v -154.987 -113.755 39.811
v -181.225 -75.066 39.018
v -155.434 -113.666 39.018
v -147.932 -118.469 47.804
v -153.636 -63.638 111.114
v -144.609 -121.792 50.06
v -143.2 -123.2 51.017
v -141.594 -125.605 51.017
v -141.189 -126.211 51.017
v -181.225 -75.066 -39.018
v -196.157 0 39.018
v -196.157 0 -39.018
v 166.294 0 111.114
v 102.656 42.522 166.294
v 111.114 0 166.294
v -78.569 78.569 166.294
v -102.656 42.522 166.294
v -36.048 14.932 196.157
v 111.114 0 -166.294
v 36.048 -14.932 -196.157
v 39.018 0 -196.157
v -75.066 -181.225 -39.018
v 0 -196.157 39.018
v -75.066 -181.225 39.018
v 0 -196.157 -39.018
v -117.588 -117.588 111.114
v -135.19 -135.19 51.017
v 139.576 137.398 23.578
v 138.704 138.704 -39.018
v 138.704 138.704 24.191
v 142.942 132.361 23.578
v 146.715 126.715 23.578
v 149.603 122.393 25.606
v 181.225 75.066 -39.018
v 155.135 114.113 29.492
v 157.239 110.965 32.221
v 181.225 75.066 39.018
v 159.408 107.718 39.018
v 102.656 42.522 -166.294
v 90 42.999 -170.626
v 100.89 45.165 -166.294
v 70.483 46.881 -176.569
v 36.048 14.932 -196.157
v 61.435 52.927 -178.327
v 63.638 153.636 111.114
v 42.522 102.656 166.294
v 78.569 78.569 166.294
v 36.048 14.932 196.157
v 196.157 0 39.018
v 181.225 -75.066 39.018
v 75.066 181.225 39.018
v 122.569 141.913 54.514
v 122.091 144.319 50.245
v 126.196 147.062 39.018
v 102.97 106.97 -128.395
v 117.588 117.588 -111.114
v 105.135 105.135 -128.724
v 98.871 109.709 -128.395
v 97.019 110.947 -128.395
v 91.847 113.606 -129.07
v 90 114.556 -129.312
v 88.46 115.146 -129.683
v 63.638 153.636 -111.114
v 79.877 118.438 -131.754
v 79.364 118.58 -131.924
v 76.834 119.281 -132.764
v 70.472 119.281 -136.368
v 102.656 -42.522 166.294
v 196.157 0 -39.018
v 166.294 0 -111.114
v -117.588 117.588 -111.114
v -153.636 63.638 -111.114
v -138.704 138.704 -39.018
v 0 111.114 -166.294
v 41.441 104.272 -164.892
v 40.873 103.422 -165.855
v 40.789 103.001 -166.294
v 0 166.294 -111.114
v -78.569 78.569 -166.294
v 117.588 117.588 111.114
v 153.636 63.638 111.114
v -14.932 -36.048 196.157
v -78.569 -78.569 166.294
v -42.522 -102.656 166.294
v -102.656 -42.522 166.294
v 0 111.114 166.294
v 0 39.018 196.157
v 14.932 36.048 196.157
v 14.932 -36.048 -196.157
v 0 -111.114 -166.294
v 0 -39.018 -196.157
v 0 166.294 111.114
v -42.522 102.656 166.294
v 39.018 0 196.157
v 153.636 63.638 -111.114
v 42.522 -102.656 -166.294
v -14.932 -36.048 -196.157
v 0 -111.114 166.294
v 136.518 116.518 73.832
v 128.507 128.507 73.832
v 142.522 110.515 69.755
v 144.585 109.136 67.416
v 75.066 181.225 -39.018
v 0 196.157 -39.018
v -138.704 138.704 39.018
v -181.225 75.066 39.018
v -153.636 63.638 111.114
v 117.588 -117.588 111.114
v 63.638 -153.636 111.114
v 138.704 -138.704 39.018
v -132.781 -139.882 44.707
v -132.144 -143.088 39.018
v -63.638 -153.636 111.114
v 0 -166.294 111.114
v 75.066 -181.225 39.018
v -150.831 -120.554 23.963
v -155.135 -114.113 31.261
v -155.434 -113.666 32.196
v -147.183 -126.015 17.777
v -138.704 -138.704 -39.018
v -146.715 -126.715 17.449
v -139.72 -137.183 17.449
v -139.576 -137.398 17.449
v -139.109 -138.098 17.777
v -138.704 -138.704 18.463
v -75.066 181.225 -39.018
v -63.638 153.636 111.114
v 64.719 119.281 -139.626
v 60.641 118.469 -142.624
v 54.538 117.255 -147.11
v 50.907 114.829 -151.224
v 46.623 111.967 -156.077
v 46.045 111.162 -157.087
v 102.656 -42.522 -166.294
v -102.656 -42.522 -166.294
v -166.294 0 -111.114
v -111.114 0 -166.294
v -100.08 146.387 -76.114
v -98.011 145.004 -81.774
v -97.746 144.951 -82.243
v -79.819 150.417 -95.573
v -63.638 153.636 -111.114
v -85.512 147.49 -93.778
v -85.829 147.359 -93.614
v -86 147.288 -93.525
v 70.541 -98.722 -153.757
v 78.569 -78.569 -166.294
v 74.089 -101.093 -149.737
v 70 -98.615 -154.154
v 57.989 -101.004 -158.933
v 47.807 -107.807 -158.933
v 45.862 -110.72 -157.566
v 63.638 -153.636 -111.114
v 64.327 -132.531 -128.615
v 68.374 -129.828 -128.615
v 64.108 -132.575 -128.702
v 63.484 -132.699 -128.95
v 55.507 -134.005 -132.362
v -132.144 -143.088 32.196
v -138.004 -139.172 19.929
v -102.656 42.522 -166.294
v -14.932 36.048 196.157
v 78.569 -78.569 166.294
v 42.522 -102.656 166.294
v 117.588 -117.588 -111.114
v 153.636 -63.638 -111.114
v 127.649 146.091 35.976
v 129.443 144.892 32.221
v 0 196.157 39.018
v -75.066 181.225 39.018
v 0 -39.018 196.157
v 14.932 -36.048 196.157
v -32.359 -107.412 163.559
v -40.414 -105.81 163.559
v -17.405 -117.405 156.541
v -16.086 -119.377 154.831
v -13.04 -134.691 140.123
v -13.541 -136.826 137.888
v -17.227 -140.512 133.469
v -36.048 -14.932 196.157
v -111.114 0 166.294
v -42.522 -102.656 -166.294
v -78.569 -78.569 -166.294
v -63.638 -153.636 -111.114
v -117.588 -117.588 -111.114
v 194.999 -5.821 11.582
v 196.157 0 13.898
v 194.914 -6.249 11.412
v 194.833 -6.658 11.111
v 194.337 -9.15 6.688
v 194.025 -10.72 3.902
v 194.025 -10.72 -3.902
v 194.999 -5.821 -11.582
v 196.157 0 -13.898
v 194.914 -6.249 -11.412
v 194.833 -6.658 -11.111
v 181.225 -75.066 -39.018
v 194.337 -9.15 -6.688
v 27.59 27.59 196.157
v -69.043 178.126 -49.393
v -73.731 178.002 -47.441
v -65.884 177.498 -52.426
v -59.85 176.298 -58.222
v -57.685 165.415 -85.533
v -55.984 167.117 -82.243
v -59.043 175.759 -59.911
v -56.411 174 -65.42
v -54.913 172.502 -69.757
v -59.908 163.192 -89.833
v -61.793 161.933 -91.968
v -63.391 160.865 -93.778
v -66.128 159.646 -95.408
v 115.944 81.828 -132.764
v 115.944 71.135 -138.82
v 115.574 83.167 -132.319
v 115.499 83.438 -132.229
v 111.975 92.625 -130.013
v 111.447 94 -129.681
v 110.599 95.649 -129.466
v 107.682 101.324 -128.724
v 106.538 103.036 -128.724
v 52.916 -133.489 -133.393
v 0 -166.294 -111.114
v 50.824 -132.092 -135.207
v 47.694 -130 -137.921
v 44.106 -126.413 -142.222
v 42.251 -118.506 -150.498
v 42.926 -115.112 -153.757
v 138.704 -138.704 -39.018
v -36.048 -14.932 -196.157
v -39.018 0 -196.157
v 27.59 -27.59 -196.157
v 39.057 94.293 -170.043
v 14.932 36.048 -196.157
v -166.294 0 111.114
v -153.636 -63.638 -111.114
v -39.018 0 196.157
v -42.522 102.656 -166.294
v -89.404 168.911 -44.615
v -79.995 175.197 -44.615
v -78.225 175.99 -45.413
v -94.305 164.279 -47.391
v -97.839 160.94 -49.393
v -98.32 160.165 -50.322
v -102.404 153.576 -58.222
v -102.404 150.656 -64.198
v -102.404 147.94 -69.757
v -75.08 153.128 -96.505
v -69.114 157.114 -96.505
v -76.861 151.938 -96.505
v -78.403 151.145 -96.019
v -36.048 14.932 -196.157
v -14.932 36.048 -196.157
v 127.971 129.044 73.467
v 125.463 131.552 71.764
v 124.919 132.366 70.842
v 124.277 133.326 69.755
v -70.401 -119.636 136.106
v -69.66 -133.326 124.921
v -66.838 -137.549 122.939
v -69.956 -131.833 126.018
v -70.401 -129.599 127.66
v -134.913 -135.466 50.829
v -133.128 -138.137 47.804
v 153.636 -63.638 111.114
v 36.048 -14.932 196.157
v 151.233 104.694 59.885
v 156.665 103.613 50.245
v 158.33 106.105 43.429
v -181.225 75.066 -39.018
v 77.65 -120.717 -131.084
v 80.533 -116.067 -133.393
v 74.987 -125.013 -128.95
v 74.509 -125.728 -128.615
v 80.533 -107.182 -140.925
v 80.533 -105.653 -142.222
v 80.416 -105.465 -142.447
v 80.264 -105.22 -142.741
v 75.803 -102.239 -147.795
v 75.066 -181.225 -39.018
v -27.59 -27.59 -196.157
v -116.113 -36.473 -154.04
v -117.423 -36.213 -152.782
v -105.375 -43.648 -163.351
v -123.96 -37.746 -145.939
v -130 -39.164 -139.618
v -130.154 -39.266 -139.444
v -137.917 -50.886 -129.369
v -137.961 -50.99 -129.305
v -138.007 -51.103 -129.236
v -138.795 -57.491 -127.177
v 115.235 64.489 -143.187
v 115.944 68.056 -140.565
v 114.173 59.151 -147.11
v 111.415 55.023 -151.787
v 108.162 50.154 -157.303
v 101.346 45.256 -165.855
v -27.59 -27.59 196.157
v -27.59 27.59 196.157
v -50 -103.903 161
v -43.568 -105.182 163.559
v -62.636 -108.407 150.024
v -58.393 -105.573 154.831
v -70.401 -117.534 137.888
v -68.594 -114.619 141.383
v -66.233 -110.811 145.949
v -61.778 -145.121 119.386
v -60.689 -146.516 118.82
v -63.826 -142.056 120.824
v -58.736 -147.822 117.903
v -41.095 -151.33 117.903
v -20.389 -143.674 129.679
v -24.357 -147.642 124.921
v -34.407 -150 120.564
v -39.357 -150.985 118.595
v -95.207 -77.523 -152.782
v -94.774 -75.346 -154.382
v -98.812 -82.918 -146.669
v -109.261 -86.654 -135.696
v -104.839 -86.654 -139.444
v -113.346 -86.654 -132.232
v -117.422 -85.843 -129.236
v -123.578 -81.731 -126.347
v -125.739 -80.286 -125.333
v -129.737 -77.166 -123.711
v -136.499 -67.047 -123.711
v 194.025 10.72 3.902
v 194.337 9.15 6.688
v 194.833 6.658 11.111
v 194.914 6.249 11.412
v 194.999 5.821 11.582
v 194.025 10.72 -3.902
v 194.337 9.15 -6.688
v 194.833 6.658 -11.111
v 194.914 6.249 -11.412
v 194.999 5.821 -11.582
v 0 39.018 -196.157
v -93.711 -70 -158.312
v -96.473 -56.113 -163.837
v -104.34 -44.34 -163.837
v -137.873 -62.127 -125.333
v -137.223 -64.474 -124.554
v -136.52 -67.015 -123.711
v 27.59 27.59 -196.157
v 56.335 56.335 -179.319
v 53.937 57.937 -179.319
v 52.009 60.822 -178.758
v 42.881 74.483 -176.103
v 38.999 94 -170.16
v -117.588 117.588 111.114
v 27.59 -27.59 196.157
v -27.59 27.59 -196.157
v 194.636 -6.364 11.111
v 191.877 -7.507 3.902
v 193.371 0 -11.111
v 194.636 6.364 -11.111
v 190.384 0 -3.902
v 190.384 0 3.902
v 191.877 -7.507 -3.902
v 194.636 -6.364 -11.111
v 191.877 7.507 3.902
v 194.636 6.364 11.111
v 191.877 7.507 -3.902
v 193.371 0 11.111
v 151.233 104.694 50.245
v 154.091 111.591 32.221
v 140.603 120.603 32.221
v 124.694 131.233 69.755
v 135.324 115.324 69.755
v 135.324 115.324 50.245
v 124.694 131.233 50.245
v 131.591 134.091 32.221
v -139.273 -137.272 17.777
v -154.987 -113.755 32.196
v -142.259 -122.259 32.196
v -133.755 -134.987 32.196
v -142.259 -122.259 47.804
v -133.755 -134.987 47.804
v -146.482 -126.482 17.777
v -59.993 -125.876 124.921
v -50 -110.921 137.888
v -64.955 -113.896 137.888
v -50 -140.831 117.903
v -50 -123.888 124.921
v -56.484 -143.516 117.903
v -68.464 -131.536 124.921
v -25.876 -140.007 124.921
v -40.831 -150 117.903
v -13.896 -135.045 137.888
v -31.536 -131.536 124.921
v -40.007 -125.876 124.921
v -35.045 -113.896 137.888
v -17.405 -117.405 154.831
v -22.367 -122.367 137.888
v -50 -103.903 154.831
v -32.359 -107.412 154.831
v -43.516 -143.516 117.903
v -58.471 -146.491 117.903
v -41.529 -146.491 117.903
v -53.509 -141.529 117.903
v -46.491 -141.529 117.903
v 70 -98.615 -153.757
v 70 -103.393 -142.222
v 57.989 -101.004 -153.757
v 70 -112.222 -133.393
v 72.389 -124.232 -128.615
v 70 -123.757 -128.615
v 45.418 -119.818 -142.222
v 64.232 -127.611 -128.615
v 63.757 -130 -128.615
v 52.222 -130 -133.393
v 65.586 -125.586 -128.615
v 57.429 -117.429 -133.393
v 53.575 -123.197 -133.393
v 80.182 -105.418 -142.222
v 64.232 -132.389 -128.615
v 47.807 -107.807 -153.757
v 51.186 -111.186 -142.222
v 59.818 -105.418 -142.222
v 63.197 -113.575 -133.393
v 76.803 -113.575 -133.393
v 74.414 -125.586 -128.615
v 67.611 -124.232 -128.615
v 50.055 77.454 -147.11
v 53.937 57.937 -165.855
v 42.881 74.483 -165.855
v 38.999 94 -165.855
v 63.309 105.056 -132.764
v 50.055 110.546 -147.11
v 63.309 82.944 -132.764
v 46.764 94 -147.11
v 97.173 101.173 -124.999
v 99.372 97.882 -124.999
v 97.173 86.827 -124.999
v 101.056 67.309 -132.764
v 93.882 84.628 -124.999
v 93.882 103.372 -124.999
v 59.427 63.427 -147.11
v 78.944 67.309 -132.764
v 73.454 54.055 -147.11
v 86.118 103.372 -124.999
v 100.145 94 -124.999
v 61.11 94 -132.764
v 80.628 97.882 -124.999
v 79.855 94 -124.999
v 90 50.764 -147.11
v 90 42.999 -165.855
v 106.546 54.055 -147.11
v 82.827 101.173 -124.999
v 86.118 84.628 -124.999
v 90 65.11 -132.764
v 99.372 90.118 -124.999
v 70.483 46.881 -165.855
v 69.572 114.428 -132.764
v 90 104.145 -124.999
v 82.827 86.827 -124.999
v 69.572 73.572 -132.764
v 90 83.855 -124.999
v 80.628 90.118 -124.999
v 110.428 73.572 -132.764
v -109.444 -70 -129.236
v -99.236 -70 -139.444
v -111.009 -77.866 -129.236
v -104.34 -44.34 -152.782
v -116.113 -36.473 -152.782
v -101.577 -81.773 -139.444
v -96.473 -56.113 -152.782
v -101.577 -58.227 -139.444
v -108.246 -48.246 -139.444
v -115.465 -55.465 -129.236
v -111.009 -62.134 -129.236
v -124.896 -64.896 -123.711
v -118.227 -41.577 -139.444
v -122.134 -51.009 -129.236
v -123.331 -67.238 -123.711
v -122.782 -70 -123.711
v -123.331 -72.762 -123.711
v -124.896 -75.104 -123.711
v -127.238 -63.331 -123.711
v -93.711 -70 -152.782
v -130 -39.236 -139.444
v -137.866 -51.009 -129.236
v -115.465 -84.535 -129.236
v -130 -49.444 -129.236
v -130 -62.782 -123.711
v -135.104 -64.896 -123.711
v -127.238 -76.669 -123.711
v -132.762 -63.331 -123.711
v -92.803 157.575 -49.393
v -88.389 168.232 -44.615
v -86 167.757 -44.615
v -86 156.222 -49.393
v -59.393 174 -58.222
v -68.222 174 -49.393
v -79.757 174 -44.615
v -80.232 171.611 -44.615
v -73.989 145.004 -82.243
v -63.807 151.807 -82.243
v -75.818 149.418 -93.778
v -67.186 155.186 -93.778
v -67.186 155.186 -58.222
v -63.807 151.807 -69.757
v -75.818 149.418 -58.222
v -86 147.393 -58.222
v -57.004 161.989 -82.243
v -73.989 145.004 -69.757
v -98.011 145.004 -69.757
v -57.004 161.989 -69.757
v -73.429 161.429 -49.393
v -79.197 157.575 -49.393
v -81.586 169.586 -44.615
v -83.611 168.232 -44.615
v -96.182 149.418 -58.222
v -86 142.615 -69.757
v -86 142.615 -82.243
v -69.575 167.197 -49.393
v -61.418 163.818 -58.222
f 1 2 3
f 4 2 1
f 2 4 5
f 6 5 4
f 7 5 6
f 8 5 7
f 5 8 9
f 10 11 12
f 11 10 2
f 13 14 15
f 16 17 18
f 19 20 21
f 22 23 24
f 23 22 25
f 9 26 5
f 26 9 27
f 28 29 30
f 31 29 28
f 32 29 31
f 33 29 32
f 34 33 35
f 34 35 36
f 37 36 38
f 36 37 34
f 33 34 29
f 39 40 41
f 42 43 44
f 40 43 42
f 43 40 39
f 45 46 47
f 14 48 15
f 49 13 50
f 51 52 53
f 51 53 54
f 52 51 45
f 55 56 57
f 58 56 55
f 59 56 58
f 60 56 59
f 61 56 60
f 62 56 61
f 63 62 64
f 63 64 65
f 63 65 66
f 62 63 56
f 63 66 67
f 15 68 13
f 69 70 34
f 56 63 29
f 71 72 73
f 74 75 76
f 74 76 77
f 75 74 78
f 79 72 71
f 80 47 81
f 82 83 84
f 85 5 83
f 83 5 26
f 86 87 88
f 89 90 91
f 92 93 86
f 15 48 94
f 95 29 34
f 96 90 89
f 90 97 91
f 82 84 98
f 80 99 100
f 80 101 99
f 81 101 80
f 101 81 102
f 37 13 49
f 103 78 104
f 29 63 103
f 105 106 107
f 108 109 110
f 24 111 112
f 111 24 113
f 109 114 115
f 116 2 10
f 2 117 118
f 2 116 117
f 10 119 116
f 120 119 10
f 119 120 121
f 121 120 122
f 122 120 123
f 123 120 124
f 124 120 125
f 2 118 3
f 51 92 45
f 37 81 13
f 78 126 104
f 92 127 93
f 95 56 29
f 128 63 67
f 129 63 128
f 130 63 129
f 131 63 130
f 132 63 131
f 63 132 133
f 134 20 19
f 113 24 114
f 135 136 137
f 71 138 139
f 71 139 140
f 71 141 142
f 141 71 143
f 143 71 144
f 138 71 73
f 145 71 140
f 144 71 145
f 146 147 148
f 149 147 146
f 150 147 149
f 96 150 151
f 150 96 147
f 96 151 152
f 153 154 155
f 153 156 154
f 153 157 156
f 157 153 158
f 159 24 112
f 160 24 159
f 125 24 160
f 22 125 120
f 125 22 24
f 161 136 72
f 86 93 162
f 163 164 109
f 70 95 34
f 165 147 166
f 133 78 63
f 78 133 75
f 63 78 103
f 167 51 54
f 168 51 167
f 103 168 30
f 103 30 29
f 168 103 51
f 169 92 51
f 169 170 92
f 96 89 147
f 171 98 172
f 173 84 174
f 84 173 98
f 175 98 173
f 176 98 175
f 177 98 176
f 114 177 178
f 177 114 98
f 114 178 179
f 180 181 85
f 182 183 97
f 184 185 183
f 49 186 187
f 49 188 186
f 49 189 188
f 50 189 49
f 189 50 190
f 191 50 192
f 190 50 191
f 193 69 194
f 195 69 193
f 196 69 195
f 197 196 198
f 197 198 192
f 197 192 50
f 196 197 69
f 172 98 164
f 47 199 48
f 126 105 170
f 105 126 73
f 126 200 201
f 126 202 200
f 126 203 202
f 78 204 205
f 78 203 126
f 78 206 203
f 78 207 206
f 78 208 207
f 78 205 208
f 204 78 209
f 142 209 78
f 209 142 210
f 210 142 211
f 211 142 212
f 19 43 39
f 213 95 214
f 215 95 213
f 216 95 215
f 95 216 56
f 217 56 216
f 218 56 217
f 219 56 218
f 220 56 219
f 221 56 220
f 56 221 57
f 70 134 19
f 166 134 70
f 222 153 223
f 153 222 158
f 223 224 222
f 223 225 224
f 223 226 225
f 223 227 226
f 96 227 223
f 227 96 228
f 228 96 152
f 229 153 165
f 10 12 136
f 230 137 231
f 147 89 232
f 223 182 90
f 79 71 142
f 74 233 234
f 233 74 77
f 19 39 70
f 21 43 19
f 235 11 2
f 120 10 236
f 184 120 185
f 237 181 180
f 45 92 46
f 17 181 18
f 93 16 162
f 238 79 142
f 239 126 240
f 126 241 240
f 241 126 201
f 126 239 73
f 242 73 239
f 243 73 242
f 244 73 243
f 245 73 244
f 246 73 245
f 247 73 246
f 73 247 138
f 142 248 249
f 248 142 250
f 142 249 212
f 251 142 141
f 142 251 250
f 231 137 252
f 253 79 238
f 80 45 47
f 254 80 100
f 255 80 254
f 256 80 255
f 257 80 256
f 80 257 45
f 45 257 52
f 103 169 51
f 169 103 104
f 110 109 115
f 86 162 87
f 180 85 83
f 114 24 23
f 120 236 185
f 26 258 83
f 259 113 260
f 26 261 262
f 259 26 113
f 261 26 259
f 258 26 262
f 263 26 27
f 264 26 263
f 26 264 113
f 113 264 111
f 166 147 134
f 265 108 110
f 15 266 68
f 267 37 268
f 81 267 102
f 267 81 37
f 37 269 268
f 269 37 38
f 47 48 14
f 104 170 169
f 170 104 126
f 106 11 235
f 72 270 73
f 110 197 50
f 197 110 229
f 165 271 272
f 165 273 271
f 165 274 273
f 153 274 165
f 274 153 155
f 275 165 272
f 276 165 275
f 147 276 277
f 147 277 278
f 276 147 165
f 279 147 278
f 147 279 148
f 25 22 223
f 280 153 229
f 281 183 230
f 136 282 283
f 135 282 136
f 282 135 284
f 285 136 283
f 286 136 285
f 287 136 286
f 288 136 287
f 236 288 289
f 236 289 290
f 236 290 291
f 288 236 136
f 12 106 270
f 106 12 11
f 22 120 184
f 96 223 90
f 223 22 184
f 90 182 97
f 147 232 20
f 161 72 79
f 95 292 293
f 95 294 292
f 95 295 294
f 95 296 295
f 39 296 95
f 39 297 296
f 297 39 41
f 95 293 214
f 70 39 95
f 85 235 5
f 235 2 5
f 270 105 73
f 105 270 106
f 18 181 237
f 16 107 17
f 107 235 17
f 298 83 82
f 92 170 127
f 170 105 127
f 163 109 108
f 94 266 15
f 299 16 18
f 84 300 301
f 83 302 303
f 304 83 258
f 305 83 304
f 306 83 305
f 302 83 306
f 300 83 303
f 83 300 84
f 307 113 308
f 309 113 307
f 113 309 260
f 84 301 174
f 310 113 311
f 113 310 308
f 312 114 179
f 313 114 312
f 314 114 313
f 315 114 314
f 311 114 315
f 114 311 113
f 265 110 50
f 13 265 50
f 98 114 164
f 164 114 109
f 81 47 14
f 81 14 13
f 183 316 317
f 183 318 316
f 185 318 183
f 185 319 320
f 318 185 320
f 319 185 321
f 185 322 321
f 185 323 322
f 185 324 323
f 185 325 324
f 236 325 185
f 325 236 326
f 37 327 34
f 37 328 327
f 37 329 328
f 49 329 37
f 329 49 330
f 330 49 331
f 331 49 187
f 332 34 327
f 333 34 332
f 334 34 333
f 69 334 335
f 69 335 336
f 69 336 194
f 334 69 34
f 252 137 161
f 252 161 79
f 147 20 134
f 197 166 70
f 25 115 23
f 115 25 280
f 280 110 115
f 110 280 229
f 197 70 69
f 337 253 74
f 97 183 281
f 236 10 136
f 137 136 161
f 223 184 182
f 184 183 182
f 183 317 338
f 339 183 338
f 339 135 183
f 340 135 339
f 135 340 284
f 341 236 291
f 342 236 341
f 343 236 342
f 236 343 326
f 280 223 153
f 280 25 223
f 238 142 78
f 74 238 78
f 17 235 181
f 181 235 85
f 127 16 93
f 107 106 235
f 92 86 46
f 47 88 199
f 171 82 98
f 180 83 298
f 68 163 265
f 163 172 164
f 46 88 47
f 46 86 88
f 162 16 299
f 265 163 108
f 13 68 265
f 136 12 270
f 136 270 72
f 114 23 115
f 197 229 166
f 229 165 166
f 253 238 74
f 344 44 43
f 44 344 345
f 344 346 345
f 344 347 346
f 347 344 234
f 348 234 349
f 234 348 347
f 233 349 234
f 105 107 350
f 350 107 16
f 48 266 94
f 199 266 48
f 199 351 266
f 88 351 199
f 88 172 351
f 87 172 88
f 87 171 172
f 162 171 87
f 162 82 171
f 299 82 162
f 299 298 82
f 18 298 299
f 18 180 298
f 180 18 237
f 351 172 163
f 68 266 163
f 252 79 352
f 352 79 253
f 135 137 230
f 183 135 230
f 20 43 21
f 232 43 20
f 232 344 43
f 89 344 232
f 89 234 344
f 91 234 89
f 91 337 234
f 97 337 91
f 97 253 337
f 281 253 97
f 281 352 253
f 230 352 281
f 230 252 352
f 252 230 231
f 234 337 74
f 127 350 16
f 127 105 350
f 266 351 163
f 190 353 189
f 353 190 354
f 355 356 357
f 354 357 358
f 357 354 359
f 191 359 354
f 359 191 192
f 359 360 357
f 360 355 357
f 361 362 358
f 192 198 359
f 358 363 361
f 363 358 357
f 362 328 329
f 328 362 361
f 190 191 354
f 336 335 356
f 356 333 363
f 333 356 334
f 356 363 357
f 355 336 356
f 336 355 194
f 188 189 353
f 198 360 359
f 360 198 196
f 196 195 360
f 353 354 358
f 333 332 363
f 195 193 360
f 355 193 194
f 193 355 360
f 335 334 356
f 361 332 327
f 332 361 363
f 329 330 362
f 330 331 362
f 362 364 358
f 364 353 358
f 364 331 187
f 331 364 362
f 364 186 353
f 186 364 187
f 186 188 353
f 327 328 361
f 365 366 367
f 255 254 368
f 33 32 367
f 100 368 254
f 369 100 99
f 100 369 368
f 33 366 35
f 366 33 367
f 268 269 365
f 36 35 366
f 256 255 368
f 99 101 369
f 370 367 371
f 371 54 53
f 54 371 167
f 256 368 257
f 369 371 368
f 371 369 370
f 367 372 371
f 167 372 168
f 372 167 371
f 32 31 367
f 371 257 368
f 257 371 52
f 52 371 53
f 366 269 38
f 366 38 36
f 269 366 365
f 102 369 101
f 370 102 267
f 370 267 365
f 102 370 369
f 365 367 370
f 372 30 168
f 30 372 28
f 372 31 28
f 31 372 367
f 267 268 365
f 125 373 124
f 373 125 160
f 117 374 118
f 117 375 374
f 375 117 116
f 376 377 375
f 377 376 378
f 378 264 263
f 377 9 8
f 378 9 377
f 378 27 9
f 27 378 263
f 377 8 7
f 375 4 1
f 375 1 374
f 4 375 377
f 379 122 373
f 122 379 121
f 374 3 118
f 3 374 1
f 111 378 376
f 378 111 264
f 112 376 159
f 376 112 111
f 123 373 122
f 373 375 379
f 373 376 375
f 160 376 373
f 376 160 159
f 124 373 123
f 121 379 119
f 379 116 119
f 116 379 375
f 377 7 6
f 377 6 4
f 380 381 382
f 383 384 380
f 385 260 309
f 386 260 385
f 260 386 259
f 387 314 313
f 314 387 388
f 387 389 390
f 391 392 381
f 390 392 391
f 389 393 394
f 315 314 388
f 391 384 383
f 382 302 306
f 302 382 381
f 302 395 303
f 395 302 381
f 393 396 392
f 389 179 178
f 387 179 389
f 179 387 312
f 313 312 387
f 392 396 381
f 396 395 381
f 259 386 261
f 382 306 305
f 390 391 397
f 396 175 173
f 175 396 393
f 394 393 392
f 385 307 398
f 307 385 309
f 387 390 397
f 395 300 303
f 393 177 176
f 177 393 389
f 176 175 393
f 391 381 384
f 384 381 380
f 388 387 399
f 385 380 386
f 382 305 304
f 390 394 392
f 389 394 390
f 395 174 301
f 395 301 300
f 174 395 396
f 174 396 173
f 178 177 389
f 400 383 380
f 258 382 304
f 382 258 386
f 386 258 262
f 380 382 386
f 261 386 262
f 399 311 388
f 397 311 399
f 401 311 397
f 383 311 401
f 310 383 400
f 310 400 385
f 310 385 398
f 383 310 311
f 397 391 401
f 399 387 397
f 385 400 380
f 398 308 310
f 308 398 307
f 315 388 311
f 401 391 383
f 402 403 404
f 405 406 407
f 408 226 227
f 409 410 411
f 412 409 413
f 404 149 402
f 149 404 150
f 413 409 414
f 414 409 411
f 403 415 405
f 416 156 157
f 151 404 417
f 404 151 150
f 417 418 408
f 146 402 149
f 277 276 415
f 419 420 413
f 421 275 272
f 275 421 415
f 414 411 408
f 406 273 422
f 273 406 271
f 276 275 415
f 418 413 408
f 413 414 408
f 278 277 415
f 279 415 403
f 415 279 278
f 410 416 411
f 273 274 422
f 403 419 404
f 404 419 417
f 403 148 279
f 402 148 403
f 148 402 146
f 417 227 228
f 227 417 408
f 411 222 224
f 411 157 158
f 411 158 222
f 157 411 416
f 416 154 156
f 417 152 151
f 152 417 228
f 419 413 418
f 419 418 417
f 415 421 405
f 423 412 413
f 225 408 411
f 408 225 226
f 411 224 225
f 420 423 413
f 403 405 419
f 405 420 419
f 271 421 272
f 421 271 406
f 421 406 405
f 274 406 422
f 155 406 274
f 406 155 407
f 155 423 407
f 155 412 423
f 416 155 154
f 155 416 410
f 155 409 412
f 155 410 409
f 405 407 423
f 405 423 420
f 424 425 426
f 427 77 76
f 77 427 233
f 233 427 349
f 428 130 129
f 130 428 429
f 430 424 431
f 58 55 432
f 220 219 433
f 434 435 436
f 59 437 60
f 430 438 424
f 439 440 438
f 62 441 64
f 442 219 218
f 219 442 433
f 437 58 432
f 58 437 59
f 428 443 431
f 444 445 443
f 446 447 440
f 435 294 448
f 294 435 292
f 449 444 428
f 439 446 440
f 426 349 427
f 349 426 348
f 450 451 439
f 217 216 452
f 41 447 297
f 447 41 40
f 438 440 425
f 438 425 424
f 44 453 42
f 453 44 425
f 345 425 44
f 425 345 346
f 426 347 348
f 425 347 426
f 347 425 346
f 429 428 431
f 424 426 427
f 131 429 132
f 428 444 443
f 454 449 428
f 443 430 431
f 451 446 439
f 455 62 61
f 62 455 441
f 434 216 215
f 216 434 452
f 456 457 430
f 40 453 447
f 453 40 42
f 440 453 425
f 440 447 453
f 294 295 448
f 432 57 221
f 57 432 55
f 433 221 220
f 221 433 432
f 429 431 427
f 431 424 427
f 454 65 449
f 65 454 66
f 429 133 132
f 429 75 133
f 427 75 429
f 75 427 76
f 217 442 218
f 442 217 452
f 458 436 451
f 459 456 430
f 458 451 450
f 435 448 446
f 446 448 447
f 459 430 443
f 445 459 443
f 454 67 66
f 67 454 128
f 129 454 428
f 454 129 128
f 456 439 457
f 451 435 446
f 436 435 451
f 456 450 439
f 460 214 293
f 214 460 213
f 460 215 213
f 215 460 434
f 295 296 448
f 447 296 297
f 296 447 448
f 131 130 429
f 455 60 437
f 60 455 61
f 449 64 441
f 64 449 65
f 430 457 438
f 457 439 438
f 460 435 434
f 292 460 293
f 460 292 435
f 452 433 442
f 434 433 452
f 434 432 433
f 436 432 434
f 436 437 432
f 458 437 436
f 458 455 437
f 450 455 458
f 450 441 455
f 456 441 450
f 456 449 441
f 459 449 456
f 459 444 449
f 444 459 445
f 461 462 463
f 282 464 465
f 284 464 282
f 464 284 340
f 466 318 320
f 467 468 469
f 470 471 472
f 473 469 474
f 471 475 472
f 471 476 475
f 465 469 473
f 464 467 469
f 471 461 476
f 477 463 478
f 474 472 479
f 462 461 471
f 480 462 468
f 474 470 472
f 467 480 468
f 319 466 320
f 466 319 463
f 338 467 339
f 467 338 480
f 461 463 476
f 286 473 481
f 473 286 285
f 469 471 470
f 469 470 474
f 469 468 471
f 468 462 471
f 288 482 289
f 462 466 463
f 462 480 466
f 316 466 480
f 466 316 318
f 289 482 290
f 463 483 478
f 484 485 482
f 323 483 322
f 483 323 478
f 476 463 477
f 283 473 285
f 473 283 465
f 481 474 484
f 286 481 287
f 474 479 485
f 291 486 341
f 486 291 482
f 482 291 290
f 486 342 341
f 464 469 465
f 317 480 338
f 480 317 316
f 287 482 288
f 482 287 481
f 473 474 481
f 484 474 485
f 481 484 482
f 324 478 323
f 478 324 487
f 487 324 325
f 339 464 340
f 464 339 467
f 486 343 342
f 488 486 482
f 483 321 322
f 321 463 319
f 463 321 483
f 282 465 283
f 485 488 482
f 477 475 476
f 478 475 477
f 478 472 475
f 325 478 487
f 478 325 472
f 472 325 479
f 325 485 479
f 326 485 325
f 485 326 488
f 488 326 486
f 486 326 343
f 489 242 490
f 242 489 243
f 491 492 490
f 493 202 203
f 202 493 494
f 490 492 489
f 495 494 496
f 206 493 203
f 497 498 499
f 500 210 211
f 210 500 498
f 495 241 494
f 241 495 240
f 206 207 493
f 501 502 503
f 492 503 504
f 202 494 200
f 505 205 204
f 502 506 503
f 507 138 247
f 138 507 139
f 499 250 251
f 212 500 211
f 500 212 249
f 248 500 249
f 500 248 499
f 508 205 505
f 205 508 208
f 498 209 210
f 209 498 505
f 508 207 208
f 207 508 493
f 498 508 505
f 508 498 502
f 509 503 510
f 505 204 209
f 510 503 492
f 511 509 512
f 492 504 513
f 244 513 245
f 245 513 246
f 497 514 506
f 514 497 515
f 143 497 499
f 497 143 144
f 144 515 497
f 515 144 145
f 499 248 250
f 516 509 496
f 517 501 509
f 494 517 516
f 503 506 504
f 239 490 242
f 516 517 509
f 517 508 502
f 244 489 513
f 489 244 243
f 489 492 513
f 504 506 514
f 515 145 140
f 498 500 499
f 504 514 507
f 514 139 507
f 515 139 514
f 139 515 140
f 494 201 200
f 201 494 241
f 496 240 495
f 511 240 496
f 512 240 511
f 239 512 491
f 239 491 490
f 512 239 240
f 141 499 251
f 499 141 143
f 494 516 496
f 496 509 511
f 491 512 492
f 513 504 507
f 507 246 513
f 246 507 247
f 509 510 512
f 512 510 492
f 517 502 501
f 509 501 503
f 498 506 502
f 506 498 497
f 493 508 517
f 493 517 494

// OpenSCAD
$fn=16;
radius=200;
difference() {
	sphere(r = radius);
	translate(v = [radius * 1.05, 0, 0]) 
		sphere(r = 20);
	translate(v = [radius * 0.85, radius * 0.75, 0.3 * radius]) 
		sphere(r = 50);
	translate(v = [radius * -0.85, radius * -0.75, 0.2 * radius]) 
		sphere(r = 40);
	translate(v = [radius * -0.85, radius * -0.75, 0.2 * radius]) 
		sphere(r = 40);
	translate(v = [radius * -0.25, radius * -0.75, 0.82 * radius]) 
		sphere(r = 47);
	translate(v = [radius * 0.35, radius * -0.65, -0.80 * radius]) 
		sphere(r = 32);
	translate(v = [radius * 0.45, radius * 0.47, -0.88 * radius]) 
		sphere(r = 52);
	translate(v = [radius * -0.75, radius * -0.35, 0.82 * radius]) 
		sphere(r = 27);
	translate(v = [radius * -0.65, radius * -0.35, -0.80 * radius]) 
		sphere(r = 37);
	translate(v = [radius * -0.43, radius * 0.87, -0.38 * radius]) 
		sphere(r = 32);
}
